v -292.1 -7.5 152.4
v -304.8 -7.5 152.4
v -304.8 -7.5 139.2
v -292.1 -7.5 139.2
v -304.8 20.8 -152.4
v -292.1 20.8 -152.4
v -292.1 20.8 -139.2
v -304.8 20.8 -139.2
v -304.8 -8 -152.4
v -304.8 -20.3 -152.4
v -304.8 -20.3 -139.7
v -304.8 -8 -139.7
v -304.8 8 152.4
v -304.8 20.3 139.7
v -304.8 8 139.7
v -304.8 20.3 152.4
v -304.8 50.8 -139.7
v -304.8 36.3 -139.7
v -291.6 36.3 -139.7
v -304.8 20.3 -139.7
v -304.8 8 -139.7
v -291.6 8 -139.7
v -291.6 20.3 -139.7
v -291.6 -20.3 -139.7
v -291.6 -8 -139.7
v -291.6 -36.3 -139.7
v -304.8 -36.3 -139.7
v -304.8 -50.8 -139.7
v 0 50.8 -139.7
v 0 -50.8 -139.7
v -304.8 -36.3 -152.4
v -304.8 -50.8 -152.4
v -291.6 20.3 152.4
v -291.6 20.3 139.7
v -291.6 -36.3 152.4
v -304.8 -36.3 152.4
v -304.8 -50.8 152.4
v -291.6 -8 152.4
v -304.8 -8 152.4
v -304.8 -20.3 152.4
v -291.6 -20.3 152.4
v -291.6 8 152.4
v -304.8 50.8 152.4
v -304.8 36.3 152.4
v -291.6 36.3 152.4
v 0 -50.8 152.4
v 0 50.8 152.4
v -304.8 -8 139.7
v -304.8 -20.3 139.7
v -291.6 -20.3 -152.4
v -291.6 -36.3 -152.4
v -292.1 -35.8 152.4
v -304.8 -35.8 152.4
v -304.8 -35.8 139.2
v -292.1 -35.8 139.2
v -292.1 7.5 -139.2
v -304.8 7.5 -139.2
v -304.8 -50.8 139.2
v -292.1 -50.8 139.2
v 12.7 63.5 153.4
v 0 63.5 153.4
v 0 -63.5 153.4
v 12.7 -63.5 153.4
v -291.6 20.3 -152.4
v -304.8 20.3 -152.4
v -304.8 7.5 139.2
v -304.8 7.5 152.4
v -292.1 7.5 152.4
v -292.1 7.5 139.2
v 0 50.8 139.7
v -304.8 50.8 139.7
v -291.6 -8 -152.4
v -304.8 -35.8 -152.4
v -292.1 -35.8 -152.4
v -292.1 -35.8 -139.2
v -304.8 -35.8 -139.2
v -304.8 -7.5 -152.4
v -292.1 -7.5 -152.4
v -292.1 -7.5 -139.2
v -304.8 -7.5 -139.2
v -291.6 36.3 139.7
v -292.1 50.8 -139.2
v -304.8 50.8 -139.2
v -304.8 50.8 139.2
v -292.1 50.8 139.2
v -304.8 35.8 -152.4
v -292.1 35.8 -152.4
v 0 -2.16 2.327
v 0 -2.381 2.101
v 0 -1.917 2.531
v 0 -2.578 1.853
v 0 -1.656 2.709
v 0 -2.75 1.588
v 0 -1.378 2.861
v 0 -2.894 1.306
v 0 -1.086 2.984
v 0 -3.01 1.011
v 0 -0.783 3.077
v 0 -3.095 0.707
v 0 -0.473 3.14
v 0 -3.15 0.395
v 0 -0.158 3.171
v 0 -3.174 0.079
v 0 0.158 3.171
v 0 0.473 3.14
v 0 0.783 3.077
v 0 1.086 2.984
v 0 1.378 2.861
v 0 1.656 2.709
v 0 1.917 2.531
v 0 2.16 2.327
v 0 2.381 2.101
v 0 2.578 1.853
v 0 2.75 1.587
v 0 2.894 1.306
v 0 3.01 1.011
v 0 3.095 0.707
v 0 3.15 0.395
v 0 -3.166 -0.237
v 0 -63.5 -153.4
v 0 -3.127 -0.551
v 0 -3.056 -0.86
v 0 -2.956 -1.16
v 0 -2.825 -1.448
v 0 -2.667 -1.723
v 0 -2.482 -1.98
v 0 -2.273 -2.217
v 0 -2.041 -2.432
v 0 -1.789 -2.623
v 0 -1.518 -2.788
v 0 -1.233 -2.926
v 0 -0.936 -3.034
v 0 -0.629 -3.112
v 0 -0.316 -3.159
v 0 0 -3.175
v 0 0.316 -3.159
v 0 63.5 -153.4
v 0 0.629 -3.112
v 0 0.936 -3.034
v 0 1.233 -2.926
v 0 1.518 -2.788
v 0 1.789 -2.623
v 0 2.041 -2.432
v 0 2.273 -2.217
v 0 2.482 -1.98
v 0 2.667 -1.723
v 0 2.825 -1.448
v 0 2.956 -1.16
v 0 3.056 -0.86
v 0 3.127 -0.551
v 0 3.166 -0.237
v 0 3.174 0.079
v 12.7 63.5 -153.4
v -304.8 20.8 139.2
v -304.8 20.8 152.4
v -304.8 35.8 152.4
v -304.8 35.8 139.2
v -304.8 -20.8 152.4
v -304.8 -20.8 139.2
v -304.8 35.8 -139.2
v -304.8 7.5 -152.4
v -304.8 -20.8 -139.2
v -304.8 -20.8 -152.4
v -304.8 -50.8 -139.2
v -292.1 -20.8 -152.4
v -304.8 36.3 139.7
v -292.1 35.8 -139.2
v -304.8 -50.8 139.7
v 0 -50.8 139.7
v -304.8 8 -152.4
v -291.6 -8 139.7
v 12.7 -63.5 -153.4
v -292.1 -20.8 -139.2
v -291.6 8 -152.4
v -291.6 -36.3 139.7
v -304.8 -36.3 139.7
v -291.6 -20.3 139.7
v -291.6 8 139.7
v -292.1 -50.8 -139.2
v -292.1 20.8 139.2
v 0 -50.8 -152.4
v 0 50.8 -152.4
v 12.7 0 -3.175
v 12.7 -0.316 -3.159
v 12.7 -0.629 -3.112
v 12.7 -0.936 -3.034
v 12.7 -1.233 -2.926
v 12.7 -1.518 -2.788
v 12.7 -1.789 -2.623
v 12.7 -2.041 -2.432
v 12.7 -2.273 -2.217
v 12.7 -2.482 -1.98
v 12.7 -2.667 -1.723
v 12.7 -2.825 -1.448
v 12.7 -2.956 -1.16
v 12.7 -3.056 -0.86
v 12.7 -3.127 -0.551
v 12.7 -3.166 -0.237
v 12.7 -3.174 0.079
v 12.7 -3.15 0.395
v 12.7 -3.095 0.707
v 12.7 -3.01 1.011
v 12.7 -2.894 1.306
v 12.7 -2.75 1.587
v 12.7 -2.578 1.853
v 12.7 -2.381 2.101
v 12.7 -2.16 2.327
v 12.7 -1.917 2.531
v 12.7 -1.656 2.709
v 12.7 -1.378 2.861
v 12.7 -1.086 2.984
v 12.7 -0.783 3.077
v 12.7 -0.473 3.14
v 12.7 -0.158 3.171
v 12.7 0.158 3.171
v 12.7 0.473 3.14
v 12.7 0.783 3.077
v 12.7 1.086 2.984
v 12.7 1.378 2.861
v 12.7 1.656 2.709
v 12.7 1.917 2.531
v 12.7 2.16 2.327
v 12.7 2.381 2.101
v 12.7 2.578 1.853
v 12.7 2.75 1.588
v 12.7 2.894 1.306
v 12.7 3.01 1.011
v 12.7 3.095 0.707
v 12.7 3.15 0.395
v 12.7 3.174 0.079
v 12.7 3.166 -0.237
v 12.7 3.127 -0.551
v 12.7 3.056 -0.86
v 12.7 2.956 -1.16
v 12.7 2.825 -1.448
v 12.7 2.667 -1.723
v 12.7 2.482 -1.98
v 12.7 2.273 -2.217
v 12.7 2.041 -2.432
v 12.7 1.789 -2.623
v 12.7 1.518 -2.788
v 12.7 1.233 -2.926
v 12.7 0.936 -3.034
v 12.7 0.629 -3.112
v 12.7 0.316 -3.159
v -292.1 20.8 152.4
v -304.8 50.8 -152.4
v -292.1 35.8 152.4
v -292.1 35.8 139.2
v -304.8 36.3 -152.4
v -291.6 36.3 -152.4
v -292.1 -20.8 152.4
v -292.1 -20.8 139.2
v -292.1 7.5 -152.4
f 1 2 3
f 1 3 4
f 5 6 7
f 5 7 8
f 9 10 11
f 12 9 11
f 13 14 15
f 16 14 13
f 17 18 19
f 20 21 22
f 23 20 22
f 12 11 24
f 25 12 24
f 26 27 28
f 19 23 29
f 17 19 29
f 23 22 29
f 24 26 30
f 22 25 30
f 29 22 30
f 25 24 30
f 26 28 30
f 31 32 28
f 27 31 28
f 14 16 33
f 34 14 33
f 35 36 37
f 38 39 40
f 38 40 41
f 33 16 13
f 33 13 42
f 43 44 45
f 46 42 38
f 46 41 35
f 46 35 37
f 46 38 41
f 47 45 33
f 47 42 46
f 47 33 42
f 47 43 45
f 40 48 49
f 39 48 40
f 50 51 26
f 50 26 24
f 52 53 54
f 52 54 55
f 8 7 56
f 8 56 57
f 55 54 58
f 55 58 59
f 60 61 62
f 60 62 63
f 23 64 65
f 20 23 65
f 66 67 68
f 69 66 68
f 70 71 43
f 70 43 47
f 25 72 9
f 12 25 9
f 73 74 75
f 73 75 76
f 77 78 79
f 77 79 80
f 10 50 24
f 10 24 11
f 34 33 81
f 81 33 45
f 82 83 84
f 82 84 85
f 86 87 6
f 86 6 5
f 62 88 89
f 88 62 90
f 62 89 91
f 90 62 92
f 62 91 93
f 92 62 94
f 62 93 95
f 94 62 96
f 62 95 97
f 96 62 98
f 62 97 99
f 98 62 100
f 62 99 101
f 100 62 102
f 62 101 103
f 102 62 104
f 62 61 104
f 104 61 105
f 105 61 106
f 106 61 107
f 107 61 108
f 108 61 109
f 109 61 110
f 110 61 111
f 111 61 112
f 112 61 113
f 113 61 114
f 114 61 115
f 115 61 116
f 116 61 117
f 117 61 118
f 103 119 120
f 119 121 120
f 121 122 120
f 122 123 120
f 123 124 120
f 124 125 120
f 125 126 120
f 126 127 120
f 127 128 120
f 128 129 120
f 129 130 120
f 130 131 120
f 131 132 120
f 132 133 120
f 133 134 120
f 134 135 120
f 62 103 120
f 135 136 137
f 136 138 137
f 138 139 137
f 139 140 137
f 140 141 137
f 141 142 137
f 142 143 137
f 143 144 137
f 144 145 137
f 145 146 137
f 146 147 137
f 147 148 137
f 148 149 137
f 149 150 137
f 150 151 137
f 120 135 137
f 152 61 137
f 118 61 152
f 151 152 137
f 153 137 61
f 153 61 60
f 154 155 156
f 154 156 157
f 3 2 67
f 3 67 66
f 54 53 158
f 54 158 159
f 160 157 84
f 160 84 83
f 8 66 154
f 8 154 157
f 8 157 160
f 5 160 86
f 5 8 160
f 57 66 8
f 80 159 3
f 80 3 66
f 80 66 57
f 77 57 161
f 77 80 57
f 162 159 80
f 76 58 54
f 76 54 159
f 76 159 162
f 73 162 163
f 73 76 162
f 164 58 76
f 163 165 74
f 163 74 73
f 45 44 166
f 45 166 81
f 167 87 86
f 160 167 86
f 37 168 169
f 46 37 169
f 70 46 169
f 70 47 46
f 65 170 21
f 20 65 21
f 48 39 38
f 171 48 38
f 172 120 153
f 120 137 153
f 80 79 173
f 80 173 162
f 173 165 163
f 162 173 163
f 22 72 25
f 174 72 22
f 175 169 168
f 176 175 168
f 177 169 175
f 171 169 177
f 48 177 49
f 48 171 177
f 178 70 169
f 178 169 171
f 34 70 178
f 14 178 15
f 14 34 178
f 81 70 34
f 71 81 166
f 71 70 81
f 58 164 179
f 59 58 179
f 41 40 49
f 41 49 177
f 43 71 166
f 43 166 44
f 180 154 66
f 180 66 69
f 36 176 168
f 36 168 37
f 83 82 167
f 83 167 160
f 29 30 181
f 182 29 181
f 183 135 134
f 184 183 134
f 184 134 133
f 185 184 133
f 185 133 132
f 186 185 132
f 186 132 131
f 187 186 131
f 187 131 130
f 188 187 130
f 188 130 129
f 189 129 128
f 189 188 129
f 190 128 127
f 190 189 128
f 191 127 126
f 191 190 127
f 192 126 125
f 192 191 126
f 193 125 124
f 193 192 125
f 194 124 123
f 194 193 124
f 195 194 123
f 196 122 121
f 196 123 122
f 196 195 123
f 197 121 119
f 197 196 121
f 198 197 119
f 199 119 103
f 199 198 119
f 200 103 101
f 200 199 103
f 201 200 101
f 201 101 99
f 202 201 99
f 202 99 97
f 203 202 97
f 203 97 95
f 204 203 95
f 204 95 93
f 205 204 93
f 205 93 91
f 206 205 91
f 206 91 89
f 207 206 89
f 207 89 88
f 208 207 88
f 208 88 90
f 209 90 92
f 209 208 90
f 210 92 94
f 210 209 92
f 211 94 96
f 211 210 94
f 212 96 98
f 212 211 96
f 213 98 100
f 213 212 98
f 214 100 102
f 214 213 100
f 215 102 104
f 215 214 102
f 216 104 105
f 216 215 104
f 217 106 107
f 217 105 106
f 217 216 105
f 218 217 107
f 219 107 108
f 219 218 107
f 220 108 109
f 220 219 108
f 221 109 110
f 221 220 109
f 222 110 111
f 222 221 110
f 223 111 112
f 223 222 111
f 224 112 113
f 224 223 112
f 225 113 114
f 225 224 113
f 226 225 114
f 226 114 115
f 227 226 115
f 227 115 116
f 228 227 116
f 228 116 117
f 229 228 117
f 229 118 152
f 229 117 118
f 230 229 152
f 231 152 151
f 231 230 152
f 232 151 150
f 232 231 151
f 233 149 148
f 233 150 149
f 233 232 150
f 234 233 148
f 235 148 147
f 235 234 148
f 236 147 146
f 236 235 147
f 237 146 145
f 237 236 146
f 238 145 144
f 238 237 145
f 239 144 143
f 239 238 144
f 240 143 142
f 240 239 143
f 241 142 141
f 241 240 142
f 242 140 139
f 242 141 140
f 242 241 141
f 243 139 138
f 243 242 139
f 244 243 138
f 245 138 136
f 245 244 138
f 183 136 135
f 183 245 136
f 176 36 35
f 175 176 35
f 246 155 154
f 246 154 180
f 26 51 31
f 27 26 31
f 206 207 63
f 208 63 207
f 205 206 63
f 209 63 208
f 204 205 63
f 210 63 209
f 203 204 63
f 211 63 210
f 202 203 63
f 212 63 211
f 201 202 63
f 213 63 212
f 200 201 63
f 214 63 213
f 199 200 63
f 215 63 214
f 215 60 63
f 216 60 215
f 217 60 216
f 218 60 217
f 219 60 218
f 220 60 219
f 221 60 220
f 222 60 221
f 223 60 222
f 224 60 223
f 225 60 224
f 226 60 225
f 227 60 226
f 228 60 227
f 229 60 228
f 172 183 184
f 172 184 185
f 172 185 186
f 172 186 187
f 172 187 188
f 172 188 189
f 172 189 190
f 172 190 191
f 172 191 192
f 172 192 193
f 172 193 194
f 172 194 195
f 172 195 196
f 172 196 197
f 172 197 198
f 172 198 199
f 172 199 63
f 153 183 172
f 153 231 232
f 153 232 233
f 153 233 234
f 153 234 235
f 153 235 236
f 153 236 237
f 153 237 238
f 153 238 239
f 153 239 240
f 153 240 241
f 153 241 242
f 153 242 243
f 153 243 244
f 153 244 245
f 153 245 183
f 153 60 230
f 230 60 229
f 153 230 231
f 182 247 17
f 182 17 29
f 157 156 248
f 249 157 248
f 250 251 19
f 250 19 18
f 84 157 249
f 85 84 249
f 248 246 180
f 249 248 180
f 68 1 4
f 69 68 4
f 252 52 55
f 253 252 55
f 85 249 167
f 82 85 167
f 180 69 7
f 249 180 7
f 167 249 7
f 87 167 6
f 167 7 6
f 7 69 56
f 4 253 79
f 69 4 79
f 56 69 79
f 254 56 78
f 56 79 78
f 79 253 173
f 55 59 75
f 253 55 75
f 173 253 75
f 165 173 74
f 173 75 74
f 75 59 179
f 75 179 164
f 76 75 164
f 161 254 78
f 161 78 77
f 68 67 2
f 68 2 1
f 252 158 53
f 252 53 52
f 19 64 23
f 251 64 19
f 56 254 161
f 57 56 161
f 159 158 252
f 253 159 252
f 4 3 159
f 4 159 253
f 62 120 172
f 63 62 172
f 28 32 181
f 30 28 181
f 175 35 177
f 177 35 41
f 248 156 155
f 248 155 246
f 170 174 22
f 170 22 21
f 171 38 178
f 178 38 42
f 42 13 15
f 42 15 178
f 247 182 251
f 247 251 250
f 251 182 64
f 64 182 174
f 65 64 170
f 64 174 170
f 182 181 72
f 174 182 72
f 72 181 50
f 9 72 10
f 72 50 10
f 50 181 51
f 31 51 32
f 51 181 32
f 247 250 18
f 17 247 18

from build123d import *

# Parameters (mm, degrees)
BOSS_EXTRUDE2_DEPTH      = 50.8
BOSS_EXTRUDE3_DEPTH      = 50.8
BOSS_EXTRUDE3_DEPTH_BACK = 50.8
SKETCH1_6_W              = 12.7
SKETCH1_6_H              = 279.4
BOSS_EXTRUDE4_DEPTH      = 50.8
BOSS_EXTRUDE4_DEPTH_BACK = 50.8
SKETCH1_8_W              = 12.7
SKETCH1_8_H              = 306.8
BOSS_EXTRUDE5_DEPTH      = 63.5
SKETCH5_W                = 13.2
SKETCH5_H                = 101.6
CUT_EXTRUDE1_DEPTH       = 0.5
SKETCH6_W                = 13.2
SKETCH6_H                = 16
CUT_EXTRUDE2_DEPTH       = 13.2
LPATTERN1_COUNT          = 3
LPATTERN1_PITCH          = 28.3
SKETCH7_W                = 12.7
SKETCH7_H                = 15
BOSS_EXTRUDE31_DEPTH     = 13.2
LPATTERN2_COUNT          = 3
LPATTERN2_PITCH          = 28.3
SKETCH51_W               = 13.2
SKETCH51_H               = 101.6
CUT_EXTRUDE11_DEPTH      = 0.5
SKETCH61_W               = 13.2
SKETCH61_H               = 16
CUT_EXTRUDE21_DEPTH      = 13.2
LPATTERN11_COUNT         = 3
LPATTERN11_PITCH         = 28.3
SKETCH71_W               = 12.7
SKETCH71_H               = 15
BOSS_EXTRUDE32_DEPTH     = 13.2
LPATTERN21_COUNT         = 3
LPATTERN21_PITCH         = 28.3


with BuildPart() as part:
    # Sketch1 → Boss-Extrude2 (new, symmetric)
    with BuildSketch(Plane(origin=(0, 0, 0), x_dir=(1, 0, 0), z_dir=(0, 1, 0))):
        Polygon((0, -152.4), (0, -139.7), (-292.1, -139.7), (-304.8, -139.7), (-304.8, -152.4), align=None)
    extrude(amount=BOSS_EXTRUDE2_DEPTH, both=True)

    # Sketch6 → Cut-Extrude2 (cut)
    with BuildSketch(Plane.XY.offset(152.4)):
        with Locations((-298.2, -28.3)):
            Rectangle(SKETCH6_W, SKETCH6_H)
    cut_extrude2 = extrude(amount=-CUT_EXTRUDE2_DEPTH, mode=Mode.SUBTRACT)

    # LPattern1: Cut-Extrude2 ×3
    with Locations(*[(0, i * LPATTERN1_PITCH, 0) for i in range(1, LPATTERN1_COUNT)]):
        add(cut_extrude2, mode=Mode.SUBTRACT)


with BuildPart() as body_2:
    # Sketch1<6> → Boss-Extrude3 (new, two sides: drawn at the far end of the back side and taken through both)
    with BuildSketch(Plane(origin=(0, 0, 0), x_dir=(1, 0, 0), z_dir=(0, 1, 0)).offset(-BOSS_EXTRUDE3_DEPTH_BACK)):
        with Locations((-298.45, 0)):
            Rectangle(SKETCH1_6_W, SKETCH1_6_H)
    extrude(amount=BOSS_EXTRUDE3_DEPTH + BOSS_EXTRUDE3_DEPTH_BACK)

    # Sketch5 → Cut-Extrude1 (cut)
    with BuildSketch(Plane.XY.offset(139.7)):
        with Locations((-298.2, 0)):
            Rectangle(SKETCH5_W, SKETCH5_H)
    extrude(amount=-CUT_EXTRUDE1_DEPTH, mode=Mode.SUBTRACT)

    # Sketch7 → Boss-Extrude31 (add)
    with BuildSketch(Plane.XY.offset(152.4)):
        with Locations((-298.45, -28.3)):
            Rectangle(SKETCH7_W, SKETCH7_H)
    boss_extrude31 = extrude(amount=-BOSS_EXTRUDE31_DEPTH)

    # LPattern2: Boss-Extrude31 ×3
    with Locations(*[(0, i * LPATTERN2_PITCH, 0) for i in range(1, LPATTERN2_COUNT)]):
        add(boss_extrude31)

    # Sketch51 → Cut-Extrude11 (cut)
    with BuildSketch(Plane(origin=(0, 0, -139.7), x_dir=(-1, 0, 0), z_dir=(0, 0, -1))):
        with Locations((298.2, 0)):
            Rectangle(SKETCH51_W, SKETCH51_H)
    extrude(amount=-CUT_EXTRUDE11_DEPTH, mode=Mode.SUBTRACT)

    # Sketch71 → Boss-Extrude32 (add)
    with BuildSketch(Plane(origin=(0, 0, -152.4), x_dir=(-1, 0, 0), z_dir=(0, 0, -1))):
        with Locations((298.45, 28.3)):
            Rectangle(SKETCH71_W, SKETCH71_H)
    boss_extrude32 = extrude(amount=-BOSS_EXTRUDE32_DEPTH)

    # LPattern21: Boss-Extrude32 ×3
    with Locations(*[(0, -i * LPATTERN21_PITCH, 0) for i in range(1, LPATTERN21_COUNT)]):
        add(boss_extrude32)


with BuildPart() as body_3:
    # Sketch1<7> → Boss-Extrude4 (new, two sides: drawn at the far end of the back side and taken through both)
    with BuildSketch(Plane(origin=(0, 0, 0), x_dir=(1, 0, 0), z_dir=(0, 1, 0)).offset(-BOSS_EXTRUDE4_DEPTH_BACK)):
        Polygon((0, 139.7), (0, 152.4), (-304.8, 152.4), (-304.8, 139.7), (-292.1, 139.7), align=None)
    extrude(amount=BOSS_EXTRUDE4_DEPTH + BOSS_EXTRUDE4_DEPTH_BACK)

    # Sketch61 → Cut-Extrude21 (cut)
    with BuildSketch(Plane(origin=(0, 0, -152.4), x_dir=(-1, 0, 0), z_dir=(0, 0, -1))):
        with Locations((298.2, 28.3)):
            Rectangle(SKETCH61_W, SKETCH61_H)
    cut_extrude21 = extrude(amount=-CUT_EXTRUDE21_DEPTH, mode=Mode.SUBTRACT)

    # LPattern11: Cut-Extrude21 ×3
    with Locations(*[(0, -i * LPATTERN11_PITCH, 0) for i in range(1, LPATTERN11_COUNT)]):
        add(cut_extrude21, mode=Mode.SUBTRACT)


with BuildPart() as body_4:
    # Sketch1<8> → Boss-Extrude5 (new, symmetric)
    with BuildSketch(Plane(origin=(0, 0, 0), x_dir=(1, 0, 0), z_dir=(0, 1, 0))):
        with Locations((6.35, 0)):
            Rectangle(SKETCH1_8_W, SKETCH1_8_H)
    extrude(amount=BOSS_EXTRUDE5_DEPTH, both=True)

    # Sketch913 → 1/4 (0.25) Diameter Hole1 (revolve, cut)
    with BuildSketch(Plane(origin=(12.7, 0, 0), x_dir=(0, 0, -1), z_dir=(0, 1, 0))):
        Polygon((0, 0), (0, 27.307732465), (3.175, 25.4), (3.175, 0), align=None)
    revolve(axis=Axis((19.05, 0, 0), (-1, 0, 0)), mode=Mode.SUBTRACT)


solid = Compound([part.part, body_2.part, body_3.part, body_4.part])
